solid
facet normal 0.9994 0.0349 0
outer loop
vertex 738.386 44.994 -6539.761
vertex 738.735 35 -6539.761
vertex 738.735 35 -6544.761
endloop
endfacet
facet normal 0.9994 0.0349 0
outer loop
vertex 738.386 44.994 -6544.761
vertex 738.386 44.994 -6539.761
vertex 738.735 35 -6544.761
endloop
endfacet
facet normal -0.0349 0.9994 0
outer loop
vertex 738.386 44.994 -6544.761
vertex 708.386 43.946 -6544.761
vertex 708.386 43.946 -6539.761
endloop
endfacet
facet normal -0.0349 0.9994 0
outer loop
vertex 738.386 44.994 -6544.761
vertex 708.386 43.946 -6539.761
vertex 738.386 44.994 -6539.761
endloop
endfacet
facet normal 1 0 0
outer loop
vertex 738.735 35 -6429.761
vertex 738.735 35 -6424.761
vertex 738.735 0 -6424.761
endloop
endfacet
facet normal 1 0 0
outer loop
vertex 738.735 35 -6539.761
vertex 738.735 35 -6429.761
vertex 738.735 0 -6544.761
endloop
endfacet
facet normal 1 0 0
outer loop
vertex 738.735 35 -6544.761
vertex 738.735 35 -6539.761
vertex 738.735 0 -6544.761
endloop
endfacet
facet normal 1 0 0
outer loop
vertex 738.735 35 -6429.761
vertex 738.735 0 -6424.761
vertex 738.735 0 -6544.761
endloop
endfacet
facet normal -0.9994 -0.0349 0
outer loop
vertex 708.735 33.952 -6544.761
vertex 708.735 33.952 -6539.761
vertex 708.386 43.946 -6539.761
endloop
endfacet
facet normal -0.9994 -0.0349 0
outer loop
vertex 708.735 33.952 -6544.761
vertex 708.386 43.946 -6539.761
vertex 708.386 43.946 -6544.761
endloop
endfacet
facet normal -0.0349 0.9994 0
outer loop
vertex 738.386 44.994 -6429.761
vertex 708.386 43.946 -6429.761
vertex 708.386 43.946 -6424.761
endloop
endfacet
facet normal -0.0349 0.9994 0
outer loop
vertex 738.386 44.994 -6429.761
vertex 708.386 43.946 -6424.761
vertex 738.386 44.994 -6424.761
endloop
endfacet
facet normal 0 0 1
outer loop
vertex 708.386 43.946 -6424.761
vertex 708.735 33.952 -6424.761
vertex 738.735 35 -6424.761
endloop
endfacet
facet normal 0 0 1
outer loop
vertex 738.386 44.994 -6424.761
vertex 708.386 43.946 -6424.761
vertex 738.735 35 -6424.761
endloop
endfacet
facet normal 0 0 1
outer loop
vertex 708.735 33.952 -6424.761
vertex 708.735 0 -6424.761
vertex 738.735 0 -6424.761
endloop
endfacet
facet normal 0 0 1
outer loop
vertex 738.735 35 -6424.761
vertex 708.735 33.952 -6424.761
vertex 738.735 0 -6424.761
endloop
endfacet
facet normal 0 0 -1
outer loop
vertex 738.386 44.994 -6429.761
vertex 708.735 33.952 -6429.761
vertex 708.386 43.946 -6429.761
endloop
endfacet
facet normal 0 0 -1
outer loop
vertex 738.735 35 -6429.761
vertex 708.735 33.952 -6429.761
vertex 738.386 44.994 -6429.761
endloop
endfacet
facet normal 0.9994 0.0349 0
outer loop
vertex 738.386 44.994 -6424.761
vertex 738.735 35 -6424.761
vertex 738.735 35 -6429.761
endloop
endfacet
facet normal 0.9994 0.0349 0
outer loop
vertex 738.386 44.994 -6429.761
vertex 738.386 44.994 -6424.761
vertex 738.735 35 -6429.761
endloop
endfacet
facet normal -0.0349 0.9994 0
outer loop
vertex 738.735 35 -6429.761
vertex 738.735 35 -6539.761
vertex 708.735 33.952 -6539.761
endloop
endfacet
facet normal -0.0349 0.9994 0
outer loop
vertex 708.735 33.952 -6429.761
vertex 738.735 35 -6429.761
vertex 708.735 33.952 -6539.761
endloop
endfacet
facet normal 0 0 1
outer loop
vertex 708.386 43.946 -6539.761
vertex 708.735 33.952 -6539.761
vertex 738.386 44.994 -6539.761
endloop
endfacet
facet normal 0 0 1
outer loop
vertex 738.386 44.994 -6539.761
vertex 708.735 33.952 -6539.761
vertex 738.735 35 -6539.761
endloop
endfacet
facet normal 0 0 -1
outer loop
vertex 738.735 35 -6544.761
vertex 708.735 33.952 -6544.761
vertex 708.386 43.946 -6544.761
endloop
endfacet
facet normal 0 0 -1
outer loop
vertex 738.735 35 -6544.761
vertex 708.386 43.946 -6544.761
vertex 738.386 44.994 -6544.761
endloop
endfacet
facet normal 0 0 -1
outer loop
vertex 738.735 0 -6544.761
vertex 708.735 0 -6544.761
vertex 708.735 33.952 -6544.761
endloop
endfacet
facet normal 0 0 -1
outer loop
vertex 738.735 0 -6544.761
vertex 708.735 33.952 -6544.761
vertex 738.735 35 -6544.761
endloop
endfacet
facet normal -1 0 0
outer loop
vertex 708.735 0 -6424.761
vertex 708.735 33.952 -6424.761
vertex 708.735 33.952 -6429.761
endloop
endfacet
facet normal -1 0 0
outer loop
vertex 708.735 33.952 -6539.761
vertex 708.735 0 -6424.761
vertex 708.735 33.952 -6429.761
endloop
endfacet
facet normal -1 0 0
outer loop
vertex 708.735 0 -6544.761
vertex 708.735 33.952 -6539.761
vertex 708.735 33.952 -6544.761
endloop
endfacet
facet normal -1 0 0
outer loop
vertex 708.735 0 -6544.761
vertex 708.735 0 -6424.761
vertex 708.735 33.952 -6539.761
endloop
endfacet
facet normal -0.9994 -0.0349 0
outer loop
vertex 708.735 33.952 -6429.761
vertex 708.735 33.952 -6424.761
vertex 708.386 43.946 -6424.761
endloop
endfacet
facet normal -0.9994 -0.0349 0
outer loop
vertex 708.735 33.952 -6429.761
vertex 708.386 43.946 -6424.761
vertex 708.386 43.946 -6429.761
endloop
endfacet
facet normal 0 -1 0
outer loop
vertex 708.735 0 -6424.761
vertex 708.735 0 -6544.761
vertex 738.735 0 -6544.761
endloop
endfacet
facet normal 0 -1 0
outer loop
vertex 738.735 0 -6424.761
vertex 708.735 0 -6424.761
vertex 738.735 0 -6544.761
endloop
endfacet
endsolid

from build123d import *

# Parameters (mm, degrees)
SKETCH_1_W          = 30
SKETCH_1_H          = 120
EXTRUDE_1_DEPTH     = 35
CUT_EXTRUDE_1_DEPTH = 750.235385976
SKETCH_4_W          = 30.018286329
SKETCH_4_H          = 5
EXTRUDE_2_DEPTH     = 10


with BuildPart() as part:
    # Эскиз1 → Бобышка-Вытянуть1 (new body)
    with BuildSketch(Plane(origin=(708.734501427, 0, -6544.760847934), x_dir=(1, 0, 0), z_dir=(0, 1, 0))):
        with Locations((15, -60)):
            Rectangle(SKETCH_1_W, SKETCH_1_H)
    extrude(amount=EXTRUDE_1_DEPTH)

    # Эскиз3 → Вырез-Вытянуть1 (cut, through all)
    with BuildSketch(Plane.XY.offset(-6424.760847934)):
        Polygon((738.734501427, 35), (708.734501427, 33.952376915), (708.734501427, 35), align=None)
    extrude(amount=-CUT_EXTRUDE_1_DEPTH, mode=Mode.SUBTRACT)

    # Эскиз4 → Бобышка-Вытянуть2 (add)
    with BuildSketch(Plane(origin=(-0.320978232, 9.191613953, 0), x_dir=(0.9993908270190961, 0.03489949670249378, 0), z_dir=(-0.03489949670249378, 0.9993908270190961, 0))):
        with Locations((724.496823549, 6542.260847934)):
            Rectangle(SKETCH_4_W, SKETCH_4_H)
        with Locations((724.496823549, 6427.260847934)):
            Rectangle(SKETCH_4_W, SKETCH_4_H)
    extrude(amount=EXTRUDE_2_DEPTH)


solid = part.part
